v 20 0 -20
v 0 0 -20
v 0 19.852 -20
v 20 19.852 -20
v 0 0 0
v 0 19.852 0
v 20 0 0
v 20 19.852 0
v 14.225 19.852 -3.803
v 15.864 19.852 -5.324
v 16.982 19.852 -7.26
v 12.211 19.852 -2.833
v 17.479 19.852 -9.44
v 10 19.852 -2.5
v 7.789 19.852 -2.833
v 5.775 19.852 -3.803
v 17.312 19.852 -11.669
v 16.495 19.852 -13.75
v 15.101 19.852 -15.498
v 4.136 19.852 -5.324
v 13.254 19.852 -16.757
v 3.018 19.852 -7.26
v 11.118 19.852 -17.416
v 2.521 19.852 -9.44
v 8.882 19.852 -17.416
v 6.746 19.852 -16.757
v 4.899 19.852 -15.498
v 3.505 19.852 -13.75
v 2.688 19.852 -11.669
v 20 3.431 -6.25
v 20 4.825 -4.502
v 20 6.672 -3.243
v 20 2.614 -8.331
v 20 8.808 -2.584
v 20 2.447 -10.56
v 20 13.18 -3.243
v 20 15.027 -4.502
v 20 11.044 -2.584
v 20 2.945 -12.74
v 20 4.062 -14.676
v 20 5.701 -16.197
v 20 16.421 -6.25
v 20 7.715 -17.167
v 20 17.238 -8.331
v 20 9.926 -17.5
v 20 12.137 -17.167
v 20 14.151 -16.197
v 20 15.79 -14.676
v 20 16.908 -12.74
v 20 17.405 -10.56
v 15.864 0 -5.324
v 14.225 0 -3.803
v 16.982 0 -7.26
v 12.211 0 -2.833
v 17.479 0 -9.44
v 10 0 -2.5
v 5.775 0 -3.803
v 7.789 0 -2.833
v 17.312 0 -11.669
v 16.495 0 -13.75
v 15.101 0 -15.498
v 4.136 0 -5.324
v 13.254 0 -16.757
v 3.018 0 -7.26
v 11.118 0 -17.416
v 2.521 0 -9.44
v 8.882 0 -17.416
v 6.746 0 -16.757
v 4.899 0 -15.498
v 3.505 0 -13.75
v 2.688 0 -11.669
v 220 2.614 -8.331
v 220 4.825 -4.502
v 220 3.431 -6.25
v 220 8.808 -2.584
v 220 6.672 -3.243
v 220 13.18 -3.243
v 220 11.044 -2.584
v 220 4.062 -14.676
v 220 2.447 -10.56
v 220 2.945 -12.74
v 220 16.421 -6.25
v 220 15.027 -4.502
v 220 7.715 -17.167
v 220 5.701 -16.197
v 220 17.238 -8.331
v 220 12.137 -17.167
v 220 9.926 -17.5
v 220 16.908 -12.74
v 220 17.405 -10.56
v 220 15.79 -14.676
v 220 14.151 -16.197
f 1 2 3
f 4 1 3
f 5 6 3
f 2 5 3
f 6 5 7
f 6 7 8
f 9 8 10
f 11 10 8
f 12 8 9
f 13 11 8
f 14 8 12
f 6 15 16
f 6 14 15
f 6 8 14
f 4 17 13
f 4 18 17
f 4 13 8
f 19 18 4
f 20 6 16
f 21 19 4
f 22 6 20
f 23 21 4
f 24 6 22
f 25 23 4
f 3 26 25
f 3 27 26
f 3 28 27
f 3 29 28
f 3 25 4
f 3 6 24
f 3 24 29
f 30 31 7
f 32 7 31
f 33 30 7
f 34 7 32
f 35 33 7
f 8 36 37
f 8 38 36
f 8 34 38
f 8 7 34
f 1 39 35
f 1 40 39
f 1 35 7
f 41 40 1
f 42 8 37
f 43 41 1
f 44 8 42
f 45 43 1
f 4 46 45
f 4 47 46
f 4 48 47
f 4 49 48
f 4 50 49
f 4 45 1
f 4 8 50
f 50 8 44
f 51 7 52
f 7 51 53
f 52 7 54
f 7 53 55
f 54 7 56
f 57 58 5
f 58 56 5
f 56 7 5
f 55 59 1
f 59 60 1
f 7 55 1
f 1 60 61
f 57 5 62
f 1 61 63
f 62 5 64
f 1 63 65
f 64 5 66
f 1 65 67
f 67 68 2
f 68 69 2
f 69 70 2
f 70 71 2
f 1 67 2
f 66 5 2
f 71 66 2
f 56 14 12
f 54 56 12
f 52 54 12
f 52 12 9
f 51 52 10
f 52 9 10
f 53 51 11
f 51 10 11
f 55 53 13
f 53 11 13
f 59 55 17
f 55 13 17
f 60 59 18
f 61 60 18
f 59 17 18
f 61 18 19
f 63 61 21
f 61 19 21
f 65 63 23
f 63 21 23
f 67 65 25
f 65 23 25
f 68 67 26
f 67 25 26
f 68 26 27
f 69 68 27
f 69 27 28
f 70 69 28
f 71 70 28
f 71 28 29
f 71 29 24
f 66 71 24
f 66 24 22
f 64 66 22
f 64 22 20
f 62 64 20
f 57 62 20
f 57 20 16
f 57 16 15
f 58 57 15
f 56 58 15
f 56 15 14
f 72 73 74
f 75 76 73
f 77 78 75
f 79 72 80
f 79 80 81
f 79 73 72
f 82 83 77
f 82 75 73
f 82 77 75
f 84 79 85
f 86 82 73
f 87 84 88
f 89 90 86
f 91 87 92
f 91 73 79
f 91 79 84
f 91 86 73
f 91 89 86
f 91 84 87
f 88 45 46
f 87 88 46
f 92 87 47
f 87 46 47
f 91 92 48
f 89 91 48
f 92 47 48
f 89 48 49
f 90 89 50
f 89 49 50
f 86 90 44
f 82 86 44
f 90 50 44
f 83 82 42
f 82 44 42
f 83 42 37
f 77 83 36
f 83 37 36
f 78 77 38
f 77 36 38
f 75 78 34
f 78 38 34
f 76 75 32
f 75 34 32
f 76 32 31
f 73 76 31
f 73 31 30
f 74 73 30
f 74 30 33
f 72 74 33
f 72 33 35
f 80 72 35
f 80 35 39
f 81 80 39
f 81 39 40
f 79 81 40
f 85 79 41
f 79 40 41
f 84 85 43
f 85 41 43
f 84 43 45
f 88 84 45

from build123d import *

# Parameters (mm, degrees)
SKETCH1_W           = 20
SKETCH1_H           = 19.85211399
BOSS_EXTRUDE1_DEPTH = 20
SKETCH2_R           = 7.5
CUT_EXTRUDE1_DEPTH  = 20
SKETCH3_R           = 7.5
BOSS_EXTRUDE2_DEPTH = 200


with BuildPart() as part:
    # Sketch1 → Boss-Extrude1 (new body)
    with BuildSketch(Plane(origin=(0, 0, 0), x_dir=(0, 0, -1), z_dir=(1, 0, 0))):
        with Locations((10, 9.926056995)):
            Rectangle(SKETCH1_W, SKETCH1_H)
    extrude(amount=BOSS_EXTRUDE1_DEPTH)

    # Sketch2 → Cut-Extrude1 (cut)
    with BuildSketch(Plane(origin=(0, 19.85211399, 0), x_dir=(1, 0, 0), z_dir=(0, 1, 0))):
        with Locations(Location((10, 10, 0), (0, 0, 270))):
            Circle(SKETCH2_R)
    extrude(amount=-CUT_EXTRUDE1_DEPTH, mode=Mode.SUBTRACT)

    # Sketch3 → Boss-Extrude2 (add)
    with BuildSketch(Plane(origin=(20, 0, 0), x_dir=(0, 0, -1), z_dir=(1, 0, 0))):
        with Locations((10, 9.926056995)):
            Circle(SKETCH3_R)
    extrude(amount=BOSS_EXTRUDE2_DEPTH)


solid = part.part
